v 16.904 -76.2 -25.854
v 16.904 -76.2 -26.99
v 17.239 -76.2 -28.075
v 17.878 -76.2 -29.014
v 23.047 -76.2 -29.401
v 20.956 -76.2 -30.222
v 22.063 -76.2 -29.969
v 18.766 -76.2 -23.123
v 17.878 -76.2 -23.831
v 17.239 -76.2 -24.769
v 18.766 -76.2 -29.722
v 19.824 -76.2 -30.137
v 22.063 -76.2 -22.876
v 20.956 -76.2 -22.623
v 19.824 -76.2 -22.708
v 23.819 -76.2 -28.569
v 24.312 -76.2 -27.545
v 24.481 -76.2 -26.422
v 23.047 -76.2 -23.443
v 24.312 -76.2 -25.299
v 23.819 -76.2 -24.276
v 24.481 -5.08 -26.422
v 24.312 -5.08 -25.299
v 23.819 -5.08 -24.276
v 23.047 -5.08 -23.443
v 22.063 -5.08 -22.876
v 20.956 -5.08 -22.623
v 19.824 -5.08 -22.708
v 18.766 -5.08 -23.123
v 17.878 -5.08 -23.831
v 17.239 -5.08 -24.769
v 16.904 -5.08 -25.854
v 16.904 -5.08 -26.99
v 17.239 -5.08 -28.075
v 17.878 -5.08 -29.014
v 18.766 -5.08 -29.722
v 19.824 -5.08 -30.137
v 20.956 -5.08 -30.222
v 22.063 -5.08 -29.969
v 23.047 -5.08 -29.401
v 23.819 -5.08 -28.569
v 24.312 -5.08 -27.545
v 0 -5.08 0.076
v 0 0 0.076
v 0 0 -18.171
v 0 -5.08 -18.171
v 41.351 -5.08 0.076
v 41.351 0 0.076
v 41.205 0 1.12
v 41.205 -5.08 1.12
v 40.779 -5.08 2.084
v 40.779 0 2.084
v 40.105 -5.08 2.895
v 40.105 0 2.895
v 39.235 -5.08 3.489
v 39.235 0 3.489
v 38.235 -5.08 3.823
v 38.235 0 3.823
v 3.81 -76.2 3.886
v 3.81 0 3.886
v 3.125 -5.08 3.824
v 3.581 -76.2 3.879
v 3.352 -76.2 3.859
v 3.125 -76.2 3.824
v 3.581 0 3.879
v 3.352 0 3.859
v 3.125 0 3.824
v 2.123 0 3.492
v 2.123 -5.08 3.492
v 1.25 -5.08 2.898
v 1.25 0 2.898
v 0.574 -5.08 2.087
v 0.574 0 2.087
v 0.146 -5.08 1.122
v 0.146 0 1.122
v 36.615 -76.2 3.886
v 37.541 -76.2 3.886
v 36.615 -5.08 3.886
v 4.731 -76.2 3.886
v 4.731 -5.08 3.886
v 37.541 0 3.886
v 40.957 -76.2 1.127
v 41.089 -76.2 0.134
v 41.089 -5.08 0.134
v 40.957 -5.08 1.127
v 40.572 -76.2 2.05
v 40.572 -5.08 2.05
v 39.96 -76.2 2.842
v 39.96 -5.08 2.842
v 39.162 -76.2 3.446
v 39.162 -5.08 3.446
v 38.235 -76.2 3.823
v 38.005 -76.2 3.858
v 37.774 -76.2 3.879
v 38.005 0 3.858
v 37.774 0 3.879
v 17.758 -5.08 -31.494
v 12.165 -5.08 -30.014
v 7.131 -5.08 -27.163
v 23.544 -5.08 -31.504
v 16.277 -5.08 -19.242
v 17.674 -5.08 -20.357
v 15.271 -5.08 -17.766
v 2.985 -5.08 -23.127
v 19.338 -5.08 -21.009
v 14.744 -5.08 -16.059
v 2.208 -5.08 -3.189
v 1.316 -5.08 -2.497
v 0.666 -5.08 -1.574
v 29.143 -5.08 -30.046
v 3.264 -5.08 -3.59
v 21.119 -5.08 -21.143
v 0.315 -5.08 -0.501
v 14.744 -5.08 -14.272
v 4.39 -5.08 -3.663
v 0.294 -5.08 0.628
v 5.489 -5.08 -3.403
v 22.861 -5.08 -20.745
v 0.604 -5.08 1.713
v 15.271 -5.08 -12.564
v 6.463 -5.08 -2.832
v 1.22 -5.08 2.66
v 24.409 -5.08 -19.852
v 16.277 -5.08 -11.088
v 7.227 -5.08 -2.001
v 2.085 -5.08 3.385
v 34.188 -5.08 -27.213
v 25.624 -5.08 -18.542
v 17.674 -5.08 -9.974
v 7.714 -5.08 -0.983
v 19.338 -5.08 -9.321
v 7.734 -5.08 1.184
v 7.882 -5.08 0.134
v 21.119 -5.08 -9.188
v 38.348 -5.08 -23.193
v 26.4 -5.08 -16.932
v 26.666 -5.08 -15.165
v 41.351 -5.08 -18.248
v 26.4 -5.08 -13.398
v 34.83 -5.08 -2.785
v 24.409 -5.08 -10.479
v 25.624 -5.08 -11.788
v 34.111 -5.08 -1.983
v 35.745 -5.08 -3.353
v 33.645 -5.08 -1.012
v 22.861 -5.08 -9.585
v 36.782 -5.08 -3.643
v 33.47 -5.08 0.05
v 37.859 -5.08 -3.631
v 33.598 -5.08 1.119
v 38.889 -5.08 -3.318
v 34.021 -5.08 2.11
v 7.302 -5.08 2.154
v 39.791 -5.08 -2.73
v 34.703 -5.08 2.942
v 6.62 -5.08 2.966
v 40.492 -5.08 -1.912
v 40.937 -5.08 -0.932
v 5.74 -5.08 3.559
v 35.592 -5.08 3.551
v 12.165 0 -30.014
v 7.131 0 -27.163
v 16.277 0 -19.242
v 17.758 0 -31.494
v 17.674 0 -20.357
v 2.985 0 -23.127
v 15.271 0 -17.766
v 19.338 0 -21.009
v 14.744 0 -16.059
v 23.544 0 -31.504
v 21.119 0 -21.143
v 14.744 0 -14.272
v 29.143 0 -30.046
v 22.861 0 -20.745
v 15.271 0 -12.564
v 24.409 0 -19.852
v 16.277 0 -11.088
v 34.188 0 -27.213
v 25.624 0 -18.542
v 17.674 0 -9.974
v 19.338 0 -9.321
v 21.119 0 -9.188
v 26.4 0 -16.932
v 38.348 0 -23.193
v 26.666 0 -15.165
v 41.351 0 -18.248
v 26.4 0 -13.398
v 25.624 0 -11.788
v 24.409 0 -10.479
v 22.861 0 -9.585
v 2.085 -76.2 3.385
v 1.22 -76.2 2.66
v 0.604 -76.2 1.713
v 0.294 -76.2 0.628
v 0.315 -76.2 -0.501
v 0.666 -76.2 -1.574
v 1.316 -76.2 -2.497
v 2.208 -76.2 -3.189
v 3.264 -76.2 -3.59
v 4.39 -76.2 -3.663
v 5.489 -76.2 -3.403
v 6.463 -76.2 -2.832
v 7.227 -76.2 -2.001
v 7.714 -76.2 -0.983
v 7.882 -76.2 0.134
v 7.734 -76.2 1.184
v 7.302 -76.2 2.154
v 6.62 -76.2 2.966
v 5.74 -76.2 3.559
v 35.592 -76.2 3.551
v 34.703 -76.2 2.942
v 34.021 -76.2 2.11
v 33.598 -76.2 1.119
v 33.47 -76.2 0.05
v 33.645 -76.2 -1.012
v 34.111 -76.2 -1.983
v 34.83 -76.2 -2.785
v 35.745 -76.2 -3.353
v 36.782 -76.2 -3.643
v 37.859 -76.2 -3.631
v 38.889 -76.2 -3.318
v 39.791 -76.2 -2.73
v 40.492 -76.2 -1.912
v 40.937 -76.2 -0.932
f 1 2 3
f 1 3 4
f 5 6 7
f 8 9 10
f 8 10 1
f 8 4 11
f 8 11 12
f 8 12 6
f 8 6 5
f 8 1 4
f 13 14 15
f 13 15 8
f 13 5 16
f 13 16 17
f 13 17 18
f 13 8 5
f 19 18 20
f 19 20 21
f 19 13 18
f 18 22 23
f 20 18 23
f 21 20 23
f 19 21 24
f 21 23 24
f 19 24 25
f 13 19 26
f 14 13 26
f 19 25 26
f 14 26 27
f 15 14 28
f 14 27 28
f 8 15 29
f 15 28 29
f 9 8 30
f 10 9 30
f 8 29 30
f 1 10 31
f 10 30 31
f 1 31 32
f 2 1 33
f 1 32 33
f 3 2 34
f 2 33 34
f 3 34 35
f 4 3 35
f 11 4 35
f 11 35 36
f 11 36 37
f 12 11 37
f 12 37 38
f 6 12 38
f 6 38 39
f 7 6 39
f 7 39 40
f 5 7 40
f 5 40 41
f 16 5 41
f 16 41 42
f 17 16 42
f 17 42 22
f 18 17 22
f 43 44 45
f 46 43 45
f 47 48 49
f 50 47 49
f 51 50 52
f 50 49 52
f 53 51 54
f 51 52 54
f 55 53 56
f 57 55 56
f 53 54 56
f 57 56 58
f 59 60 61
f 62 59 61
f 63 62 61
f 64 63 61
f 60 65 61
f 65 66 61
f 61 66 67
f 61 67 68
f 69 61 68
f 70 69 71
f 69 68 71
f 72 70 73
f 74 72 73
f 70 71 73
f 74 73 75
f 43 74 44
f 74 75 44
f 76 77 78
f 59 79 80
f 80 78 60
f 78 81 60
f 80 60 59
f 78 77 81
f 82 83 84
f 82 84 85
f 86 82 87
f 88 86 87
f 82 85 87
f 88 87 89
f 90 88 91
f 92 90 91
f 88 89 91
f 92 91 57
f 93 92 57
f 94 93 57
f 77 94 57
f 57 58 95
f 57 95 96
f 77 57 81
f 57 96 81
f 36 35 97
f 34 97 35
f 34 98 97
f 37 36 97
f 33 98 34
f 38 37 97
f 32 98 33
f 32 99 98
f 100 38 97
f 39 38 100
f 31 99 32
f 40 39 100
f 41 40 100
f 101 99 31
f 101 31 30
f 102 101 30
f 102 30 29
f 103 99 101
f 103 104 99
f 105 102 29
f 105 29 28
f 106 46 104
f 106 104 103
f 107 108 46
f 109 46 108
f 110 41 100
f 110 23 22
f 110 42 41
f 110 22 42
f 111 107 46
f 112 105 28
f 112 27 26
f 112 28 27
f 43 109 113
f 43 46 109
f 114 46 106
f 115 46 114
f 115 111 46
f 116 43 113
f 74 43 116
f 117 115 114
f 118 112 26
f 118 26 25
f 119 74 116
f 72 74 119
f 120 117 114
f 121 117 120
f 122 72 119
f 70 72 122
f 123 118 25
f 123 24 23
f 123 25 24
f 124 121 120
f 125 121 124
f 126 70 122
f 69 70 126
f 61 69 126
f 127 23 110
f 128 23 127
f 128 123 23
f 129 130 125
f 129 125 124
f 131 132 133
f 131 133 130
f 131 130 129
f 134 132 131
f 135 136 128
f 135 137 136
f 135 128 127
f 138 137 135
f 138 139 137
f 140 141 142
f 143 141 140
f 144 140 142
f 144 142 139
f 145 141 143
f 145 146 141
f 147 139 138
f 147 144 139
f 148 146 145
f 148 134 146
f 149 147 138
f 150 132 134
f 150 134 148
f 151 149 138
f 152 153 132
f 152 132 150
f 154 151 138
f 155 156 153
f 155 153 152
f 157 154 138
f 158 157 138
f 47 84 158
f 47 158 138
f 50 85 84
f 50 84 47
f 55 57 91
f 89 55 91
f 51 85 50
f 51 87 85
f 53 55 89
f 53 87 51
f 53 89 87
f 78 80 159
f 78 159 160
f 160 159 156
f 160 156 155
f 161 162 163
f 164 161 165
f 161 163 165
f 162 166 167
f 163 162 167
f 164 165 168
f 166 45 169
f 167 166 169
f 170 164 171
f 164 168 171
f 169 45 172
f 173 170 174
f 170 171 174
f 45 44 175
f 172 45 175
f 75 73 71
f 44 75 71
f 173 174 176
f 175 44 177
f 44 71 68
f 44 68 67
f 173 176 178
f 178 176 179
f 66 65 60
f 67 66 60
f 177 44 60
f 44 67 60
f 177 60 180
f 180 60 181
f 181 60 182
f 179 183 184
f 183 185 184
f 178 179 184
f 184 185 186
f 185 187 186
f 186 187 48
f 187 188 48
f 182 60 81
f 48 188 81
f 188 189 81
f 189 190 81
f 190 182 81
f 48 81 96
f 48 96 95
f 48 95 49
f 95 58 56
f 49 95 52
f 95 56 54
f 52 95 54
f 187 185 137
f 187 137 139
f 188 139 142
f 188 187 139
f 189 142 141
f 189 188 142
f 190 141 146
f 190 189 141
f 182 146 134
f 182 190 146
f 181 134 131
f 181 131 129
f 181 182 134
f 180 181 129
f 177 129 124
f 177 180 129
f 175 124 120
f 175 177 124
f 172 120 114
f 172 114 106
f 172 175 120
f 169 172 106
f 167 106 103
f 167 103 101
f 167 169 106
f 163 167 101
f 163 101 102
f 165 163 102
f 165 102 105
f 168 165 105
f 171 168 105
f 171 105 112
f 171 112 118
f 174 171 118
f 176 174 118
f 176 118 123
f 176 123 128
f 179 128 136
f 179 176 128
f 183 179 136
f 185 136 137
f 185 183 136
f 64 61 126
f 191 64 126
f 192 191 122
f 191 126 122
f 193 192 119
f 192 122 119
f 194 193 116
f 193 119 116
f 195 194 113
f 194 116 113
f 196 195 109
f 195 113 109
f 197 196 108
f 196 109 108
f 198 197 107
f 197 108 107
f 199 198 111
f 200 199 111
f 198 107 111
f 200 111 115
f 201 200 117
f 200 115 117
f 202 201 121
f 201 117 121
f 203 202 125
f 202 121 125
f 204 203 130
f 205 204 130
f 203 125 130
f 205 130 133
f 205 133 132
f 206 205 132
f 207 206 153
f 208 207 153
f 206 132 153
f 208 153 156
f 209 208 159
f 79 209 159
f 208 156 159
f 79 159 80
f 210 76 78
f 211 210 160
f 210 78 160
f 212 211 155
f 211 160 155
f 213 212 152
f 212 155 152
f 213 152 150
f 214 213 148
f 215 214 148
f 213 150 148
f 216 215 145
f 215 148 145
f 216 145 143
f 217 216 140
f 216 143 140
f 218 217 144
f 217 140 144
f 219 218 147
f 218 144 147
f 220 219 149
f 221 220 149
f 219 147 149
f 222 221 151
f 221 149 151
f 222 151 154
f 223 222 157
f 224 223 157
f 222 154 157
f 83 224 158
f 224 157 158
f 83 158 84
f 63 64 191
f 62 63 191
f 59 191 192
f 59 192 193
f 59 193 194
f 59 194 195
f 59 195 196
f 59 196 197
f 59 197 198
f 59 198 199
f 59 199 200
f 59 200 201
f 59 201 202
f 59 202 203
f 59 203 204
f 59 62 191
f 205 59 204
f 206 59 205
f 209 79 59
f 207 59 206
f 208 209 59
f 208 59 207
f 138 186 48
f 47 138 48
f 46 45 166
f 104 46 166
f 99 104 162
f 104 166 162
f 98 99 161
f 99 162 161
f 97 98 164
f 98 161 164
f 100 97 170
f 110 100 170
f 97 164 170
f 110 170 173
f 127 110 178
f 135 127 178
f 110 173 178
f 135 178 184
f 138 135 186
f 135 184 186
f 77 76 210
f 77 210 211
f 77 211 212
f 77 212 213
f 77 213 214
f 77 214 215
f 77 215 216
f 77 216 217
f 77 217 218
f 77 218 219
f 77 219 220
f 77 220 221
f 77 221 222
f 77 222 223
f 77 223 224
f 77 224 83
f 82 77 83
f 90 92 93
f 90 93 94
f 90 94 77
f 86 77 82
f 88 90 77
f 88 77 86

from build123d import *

# Parameters (mm, degrees)
F0_R     = 3.81
F0_R_2   = 5.9944
F1_DEPTH = 5.08
F2_DEPTH = 76.2
F3_DEPTH = 76.2


with BuildPart() as f1:
    # F0 (on Front) → F1 (new body)
    with BuildSketch(Plane.XZ):
        with BuildLine():
            Line((36.615222, 3.8862), (4.730572, 3.8862))
            ThreePointArc((4.730572, 3.8862), (6.989429, 2.583681), (7.881685, 0.133605))
            ThreePointArc((7.881685, 0.133605), (1.736186, -2.876635), (3.124967, 3.82411))
            ThreePointArc((3.124967, 3.82411), (0.883733, 2.51609), (0, 0.0762))
            Line((0, 0.0762), (0, 0))
            Line((0, 0), (0, -18.171335))
            ThreePointArc((0, -18.171335), (20.650768, -31.684862), (41.3512, -18.247535))
            Line((41.3512, -18.247535), (41.3512, 0))
            Line((41.3512, 0), (41.3512, 0.0762))
            ThreePointArc((41.3512, 0.0762), (40.470217, 2.512788), (38.234685, 3.822555))
            ThreePointArc((38.234685, 3.822555), (40.291913, 2.466165), (41.08876, 0.134425))
            ThreePointArc((41.08876, 0.134425), (34.830493, -2.784837), (36.615222, 3.8862))
        make_face()
        with Locations((20.671425, -26.422268)):
            Circle(F0_R, mode=Mode.SUBTRACT)
        with Locations((20.671425, -15.165246)):
            Circle(F0_R_2, mode=Mode.SUBTRACT)
    extrude(amount=F1_DEPTH)

    # F0 (on Front) → F2 (join)
    with BuildSketch(Plane.XZ):
        with BuildLine():
            Line((4.730572, 3.8862), (3.81, 3.8862))
            ThreePointArc((3.81, 3.8862), (3.46608, 3.870646), (3.124967, 3.82411))
            ThreePointArc((3.124967, 3.82411), (1.736186, -2.876635), (7.881685, 0.133605))
            ThreePointArc((7.881685, 0.133605), (6.989429, 2.583681), (4.730572, 3.8862))
        make_face()
        with BuildLine():
            Line((37.5412, 3.8862), (36.615222, 3.8862))
            ThreePointArc((36.615222, 3.8862), (34.830493, -2.784837), (41.08876, 0.134425))
            ThreePointArc((41.08876, 0.134425), (40.291913, 2.466165), (38.234685, 3.822555))
            ThreePointArc((38.234685, 3.822555), (37.8894, 3.870255), (37.5412, 3.8862))
        make_face()
    extrude(amount=F2_DEPTH)

    # F0 (on Front) → F3 (join)
    with BuildSketch(Plane.XZ):
        with Locations((20.671425, -26.422268)):
            Circle(F0_R)
    extrude(amount=F3_DEPTH)


solid = f1.part
